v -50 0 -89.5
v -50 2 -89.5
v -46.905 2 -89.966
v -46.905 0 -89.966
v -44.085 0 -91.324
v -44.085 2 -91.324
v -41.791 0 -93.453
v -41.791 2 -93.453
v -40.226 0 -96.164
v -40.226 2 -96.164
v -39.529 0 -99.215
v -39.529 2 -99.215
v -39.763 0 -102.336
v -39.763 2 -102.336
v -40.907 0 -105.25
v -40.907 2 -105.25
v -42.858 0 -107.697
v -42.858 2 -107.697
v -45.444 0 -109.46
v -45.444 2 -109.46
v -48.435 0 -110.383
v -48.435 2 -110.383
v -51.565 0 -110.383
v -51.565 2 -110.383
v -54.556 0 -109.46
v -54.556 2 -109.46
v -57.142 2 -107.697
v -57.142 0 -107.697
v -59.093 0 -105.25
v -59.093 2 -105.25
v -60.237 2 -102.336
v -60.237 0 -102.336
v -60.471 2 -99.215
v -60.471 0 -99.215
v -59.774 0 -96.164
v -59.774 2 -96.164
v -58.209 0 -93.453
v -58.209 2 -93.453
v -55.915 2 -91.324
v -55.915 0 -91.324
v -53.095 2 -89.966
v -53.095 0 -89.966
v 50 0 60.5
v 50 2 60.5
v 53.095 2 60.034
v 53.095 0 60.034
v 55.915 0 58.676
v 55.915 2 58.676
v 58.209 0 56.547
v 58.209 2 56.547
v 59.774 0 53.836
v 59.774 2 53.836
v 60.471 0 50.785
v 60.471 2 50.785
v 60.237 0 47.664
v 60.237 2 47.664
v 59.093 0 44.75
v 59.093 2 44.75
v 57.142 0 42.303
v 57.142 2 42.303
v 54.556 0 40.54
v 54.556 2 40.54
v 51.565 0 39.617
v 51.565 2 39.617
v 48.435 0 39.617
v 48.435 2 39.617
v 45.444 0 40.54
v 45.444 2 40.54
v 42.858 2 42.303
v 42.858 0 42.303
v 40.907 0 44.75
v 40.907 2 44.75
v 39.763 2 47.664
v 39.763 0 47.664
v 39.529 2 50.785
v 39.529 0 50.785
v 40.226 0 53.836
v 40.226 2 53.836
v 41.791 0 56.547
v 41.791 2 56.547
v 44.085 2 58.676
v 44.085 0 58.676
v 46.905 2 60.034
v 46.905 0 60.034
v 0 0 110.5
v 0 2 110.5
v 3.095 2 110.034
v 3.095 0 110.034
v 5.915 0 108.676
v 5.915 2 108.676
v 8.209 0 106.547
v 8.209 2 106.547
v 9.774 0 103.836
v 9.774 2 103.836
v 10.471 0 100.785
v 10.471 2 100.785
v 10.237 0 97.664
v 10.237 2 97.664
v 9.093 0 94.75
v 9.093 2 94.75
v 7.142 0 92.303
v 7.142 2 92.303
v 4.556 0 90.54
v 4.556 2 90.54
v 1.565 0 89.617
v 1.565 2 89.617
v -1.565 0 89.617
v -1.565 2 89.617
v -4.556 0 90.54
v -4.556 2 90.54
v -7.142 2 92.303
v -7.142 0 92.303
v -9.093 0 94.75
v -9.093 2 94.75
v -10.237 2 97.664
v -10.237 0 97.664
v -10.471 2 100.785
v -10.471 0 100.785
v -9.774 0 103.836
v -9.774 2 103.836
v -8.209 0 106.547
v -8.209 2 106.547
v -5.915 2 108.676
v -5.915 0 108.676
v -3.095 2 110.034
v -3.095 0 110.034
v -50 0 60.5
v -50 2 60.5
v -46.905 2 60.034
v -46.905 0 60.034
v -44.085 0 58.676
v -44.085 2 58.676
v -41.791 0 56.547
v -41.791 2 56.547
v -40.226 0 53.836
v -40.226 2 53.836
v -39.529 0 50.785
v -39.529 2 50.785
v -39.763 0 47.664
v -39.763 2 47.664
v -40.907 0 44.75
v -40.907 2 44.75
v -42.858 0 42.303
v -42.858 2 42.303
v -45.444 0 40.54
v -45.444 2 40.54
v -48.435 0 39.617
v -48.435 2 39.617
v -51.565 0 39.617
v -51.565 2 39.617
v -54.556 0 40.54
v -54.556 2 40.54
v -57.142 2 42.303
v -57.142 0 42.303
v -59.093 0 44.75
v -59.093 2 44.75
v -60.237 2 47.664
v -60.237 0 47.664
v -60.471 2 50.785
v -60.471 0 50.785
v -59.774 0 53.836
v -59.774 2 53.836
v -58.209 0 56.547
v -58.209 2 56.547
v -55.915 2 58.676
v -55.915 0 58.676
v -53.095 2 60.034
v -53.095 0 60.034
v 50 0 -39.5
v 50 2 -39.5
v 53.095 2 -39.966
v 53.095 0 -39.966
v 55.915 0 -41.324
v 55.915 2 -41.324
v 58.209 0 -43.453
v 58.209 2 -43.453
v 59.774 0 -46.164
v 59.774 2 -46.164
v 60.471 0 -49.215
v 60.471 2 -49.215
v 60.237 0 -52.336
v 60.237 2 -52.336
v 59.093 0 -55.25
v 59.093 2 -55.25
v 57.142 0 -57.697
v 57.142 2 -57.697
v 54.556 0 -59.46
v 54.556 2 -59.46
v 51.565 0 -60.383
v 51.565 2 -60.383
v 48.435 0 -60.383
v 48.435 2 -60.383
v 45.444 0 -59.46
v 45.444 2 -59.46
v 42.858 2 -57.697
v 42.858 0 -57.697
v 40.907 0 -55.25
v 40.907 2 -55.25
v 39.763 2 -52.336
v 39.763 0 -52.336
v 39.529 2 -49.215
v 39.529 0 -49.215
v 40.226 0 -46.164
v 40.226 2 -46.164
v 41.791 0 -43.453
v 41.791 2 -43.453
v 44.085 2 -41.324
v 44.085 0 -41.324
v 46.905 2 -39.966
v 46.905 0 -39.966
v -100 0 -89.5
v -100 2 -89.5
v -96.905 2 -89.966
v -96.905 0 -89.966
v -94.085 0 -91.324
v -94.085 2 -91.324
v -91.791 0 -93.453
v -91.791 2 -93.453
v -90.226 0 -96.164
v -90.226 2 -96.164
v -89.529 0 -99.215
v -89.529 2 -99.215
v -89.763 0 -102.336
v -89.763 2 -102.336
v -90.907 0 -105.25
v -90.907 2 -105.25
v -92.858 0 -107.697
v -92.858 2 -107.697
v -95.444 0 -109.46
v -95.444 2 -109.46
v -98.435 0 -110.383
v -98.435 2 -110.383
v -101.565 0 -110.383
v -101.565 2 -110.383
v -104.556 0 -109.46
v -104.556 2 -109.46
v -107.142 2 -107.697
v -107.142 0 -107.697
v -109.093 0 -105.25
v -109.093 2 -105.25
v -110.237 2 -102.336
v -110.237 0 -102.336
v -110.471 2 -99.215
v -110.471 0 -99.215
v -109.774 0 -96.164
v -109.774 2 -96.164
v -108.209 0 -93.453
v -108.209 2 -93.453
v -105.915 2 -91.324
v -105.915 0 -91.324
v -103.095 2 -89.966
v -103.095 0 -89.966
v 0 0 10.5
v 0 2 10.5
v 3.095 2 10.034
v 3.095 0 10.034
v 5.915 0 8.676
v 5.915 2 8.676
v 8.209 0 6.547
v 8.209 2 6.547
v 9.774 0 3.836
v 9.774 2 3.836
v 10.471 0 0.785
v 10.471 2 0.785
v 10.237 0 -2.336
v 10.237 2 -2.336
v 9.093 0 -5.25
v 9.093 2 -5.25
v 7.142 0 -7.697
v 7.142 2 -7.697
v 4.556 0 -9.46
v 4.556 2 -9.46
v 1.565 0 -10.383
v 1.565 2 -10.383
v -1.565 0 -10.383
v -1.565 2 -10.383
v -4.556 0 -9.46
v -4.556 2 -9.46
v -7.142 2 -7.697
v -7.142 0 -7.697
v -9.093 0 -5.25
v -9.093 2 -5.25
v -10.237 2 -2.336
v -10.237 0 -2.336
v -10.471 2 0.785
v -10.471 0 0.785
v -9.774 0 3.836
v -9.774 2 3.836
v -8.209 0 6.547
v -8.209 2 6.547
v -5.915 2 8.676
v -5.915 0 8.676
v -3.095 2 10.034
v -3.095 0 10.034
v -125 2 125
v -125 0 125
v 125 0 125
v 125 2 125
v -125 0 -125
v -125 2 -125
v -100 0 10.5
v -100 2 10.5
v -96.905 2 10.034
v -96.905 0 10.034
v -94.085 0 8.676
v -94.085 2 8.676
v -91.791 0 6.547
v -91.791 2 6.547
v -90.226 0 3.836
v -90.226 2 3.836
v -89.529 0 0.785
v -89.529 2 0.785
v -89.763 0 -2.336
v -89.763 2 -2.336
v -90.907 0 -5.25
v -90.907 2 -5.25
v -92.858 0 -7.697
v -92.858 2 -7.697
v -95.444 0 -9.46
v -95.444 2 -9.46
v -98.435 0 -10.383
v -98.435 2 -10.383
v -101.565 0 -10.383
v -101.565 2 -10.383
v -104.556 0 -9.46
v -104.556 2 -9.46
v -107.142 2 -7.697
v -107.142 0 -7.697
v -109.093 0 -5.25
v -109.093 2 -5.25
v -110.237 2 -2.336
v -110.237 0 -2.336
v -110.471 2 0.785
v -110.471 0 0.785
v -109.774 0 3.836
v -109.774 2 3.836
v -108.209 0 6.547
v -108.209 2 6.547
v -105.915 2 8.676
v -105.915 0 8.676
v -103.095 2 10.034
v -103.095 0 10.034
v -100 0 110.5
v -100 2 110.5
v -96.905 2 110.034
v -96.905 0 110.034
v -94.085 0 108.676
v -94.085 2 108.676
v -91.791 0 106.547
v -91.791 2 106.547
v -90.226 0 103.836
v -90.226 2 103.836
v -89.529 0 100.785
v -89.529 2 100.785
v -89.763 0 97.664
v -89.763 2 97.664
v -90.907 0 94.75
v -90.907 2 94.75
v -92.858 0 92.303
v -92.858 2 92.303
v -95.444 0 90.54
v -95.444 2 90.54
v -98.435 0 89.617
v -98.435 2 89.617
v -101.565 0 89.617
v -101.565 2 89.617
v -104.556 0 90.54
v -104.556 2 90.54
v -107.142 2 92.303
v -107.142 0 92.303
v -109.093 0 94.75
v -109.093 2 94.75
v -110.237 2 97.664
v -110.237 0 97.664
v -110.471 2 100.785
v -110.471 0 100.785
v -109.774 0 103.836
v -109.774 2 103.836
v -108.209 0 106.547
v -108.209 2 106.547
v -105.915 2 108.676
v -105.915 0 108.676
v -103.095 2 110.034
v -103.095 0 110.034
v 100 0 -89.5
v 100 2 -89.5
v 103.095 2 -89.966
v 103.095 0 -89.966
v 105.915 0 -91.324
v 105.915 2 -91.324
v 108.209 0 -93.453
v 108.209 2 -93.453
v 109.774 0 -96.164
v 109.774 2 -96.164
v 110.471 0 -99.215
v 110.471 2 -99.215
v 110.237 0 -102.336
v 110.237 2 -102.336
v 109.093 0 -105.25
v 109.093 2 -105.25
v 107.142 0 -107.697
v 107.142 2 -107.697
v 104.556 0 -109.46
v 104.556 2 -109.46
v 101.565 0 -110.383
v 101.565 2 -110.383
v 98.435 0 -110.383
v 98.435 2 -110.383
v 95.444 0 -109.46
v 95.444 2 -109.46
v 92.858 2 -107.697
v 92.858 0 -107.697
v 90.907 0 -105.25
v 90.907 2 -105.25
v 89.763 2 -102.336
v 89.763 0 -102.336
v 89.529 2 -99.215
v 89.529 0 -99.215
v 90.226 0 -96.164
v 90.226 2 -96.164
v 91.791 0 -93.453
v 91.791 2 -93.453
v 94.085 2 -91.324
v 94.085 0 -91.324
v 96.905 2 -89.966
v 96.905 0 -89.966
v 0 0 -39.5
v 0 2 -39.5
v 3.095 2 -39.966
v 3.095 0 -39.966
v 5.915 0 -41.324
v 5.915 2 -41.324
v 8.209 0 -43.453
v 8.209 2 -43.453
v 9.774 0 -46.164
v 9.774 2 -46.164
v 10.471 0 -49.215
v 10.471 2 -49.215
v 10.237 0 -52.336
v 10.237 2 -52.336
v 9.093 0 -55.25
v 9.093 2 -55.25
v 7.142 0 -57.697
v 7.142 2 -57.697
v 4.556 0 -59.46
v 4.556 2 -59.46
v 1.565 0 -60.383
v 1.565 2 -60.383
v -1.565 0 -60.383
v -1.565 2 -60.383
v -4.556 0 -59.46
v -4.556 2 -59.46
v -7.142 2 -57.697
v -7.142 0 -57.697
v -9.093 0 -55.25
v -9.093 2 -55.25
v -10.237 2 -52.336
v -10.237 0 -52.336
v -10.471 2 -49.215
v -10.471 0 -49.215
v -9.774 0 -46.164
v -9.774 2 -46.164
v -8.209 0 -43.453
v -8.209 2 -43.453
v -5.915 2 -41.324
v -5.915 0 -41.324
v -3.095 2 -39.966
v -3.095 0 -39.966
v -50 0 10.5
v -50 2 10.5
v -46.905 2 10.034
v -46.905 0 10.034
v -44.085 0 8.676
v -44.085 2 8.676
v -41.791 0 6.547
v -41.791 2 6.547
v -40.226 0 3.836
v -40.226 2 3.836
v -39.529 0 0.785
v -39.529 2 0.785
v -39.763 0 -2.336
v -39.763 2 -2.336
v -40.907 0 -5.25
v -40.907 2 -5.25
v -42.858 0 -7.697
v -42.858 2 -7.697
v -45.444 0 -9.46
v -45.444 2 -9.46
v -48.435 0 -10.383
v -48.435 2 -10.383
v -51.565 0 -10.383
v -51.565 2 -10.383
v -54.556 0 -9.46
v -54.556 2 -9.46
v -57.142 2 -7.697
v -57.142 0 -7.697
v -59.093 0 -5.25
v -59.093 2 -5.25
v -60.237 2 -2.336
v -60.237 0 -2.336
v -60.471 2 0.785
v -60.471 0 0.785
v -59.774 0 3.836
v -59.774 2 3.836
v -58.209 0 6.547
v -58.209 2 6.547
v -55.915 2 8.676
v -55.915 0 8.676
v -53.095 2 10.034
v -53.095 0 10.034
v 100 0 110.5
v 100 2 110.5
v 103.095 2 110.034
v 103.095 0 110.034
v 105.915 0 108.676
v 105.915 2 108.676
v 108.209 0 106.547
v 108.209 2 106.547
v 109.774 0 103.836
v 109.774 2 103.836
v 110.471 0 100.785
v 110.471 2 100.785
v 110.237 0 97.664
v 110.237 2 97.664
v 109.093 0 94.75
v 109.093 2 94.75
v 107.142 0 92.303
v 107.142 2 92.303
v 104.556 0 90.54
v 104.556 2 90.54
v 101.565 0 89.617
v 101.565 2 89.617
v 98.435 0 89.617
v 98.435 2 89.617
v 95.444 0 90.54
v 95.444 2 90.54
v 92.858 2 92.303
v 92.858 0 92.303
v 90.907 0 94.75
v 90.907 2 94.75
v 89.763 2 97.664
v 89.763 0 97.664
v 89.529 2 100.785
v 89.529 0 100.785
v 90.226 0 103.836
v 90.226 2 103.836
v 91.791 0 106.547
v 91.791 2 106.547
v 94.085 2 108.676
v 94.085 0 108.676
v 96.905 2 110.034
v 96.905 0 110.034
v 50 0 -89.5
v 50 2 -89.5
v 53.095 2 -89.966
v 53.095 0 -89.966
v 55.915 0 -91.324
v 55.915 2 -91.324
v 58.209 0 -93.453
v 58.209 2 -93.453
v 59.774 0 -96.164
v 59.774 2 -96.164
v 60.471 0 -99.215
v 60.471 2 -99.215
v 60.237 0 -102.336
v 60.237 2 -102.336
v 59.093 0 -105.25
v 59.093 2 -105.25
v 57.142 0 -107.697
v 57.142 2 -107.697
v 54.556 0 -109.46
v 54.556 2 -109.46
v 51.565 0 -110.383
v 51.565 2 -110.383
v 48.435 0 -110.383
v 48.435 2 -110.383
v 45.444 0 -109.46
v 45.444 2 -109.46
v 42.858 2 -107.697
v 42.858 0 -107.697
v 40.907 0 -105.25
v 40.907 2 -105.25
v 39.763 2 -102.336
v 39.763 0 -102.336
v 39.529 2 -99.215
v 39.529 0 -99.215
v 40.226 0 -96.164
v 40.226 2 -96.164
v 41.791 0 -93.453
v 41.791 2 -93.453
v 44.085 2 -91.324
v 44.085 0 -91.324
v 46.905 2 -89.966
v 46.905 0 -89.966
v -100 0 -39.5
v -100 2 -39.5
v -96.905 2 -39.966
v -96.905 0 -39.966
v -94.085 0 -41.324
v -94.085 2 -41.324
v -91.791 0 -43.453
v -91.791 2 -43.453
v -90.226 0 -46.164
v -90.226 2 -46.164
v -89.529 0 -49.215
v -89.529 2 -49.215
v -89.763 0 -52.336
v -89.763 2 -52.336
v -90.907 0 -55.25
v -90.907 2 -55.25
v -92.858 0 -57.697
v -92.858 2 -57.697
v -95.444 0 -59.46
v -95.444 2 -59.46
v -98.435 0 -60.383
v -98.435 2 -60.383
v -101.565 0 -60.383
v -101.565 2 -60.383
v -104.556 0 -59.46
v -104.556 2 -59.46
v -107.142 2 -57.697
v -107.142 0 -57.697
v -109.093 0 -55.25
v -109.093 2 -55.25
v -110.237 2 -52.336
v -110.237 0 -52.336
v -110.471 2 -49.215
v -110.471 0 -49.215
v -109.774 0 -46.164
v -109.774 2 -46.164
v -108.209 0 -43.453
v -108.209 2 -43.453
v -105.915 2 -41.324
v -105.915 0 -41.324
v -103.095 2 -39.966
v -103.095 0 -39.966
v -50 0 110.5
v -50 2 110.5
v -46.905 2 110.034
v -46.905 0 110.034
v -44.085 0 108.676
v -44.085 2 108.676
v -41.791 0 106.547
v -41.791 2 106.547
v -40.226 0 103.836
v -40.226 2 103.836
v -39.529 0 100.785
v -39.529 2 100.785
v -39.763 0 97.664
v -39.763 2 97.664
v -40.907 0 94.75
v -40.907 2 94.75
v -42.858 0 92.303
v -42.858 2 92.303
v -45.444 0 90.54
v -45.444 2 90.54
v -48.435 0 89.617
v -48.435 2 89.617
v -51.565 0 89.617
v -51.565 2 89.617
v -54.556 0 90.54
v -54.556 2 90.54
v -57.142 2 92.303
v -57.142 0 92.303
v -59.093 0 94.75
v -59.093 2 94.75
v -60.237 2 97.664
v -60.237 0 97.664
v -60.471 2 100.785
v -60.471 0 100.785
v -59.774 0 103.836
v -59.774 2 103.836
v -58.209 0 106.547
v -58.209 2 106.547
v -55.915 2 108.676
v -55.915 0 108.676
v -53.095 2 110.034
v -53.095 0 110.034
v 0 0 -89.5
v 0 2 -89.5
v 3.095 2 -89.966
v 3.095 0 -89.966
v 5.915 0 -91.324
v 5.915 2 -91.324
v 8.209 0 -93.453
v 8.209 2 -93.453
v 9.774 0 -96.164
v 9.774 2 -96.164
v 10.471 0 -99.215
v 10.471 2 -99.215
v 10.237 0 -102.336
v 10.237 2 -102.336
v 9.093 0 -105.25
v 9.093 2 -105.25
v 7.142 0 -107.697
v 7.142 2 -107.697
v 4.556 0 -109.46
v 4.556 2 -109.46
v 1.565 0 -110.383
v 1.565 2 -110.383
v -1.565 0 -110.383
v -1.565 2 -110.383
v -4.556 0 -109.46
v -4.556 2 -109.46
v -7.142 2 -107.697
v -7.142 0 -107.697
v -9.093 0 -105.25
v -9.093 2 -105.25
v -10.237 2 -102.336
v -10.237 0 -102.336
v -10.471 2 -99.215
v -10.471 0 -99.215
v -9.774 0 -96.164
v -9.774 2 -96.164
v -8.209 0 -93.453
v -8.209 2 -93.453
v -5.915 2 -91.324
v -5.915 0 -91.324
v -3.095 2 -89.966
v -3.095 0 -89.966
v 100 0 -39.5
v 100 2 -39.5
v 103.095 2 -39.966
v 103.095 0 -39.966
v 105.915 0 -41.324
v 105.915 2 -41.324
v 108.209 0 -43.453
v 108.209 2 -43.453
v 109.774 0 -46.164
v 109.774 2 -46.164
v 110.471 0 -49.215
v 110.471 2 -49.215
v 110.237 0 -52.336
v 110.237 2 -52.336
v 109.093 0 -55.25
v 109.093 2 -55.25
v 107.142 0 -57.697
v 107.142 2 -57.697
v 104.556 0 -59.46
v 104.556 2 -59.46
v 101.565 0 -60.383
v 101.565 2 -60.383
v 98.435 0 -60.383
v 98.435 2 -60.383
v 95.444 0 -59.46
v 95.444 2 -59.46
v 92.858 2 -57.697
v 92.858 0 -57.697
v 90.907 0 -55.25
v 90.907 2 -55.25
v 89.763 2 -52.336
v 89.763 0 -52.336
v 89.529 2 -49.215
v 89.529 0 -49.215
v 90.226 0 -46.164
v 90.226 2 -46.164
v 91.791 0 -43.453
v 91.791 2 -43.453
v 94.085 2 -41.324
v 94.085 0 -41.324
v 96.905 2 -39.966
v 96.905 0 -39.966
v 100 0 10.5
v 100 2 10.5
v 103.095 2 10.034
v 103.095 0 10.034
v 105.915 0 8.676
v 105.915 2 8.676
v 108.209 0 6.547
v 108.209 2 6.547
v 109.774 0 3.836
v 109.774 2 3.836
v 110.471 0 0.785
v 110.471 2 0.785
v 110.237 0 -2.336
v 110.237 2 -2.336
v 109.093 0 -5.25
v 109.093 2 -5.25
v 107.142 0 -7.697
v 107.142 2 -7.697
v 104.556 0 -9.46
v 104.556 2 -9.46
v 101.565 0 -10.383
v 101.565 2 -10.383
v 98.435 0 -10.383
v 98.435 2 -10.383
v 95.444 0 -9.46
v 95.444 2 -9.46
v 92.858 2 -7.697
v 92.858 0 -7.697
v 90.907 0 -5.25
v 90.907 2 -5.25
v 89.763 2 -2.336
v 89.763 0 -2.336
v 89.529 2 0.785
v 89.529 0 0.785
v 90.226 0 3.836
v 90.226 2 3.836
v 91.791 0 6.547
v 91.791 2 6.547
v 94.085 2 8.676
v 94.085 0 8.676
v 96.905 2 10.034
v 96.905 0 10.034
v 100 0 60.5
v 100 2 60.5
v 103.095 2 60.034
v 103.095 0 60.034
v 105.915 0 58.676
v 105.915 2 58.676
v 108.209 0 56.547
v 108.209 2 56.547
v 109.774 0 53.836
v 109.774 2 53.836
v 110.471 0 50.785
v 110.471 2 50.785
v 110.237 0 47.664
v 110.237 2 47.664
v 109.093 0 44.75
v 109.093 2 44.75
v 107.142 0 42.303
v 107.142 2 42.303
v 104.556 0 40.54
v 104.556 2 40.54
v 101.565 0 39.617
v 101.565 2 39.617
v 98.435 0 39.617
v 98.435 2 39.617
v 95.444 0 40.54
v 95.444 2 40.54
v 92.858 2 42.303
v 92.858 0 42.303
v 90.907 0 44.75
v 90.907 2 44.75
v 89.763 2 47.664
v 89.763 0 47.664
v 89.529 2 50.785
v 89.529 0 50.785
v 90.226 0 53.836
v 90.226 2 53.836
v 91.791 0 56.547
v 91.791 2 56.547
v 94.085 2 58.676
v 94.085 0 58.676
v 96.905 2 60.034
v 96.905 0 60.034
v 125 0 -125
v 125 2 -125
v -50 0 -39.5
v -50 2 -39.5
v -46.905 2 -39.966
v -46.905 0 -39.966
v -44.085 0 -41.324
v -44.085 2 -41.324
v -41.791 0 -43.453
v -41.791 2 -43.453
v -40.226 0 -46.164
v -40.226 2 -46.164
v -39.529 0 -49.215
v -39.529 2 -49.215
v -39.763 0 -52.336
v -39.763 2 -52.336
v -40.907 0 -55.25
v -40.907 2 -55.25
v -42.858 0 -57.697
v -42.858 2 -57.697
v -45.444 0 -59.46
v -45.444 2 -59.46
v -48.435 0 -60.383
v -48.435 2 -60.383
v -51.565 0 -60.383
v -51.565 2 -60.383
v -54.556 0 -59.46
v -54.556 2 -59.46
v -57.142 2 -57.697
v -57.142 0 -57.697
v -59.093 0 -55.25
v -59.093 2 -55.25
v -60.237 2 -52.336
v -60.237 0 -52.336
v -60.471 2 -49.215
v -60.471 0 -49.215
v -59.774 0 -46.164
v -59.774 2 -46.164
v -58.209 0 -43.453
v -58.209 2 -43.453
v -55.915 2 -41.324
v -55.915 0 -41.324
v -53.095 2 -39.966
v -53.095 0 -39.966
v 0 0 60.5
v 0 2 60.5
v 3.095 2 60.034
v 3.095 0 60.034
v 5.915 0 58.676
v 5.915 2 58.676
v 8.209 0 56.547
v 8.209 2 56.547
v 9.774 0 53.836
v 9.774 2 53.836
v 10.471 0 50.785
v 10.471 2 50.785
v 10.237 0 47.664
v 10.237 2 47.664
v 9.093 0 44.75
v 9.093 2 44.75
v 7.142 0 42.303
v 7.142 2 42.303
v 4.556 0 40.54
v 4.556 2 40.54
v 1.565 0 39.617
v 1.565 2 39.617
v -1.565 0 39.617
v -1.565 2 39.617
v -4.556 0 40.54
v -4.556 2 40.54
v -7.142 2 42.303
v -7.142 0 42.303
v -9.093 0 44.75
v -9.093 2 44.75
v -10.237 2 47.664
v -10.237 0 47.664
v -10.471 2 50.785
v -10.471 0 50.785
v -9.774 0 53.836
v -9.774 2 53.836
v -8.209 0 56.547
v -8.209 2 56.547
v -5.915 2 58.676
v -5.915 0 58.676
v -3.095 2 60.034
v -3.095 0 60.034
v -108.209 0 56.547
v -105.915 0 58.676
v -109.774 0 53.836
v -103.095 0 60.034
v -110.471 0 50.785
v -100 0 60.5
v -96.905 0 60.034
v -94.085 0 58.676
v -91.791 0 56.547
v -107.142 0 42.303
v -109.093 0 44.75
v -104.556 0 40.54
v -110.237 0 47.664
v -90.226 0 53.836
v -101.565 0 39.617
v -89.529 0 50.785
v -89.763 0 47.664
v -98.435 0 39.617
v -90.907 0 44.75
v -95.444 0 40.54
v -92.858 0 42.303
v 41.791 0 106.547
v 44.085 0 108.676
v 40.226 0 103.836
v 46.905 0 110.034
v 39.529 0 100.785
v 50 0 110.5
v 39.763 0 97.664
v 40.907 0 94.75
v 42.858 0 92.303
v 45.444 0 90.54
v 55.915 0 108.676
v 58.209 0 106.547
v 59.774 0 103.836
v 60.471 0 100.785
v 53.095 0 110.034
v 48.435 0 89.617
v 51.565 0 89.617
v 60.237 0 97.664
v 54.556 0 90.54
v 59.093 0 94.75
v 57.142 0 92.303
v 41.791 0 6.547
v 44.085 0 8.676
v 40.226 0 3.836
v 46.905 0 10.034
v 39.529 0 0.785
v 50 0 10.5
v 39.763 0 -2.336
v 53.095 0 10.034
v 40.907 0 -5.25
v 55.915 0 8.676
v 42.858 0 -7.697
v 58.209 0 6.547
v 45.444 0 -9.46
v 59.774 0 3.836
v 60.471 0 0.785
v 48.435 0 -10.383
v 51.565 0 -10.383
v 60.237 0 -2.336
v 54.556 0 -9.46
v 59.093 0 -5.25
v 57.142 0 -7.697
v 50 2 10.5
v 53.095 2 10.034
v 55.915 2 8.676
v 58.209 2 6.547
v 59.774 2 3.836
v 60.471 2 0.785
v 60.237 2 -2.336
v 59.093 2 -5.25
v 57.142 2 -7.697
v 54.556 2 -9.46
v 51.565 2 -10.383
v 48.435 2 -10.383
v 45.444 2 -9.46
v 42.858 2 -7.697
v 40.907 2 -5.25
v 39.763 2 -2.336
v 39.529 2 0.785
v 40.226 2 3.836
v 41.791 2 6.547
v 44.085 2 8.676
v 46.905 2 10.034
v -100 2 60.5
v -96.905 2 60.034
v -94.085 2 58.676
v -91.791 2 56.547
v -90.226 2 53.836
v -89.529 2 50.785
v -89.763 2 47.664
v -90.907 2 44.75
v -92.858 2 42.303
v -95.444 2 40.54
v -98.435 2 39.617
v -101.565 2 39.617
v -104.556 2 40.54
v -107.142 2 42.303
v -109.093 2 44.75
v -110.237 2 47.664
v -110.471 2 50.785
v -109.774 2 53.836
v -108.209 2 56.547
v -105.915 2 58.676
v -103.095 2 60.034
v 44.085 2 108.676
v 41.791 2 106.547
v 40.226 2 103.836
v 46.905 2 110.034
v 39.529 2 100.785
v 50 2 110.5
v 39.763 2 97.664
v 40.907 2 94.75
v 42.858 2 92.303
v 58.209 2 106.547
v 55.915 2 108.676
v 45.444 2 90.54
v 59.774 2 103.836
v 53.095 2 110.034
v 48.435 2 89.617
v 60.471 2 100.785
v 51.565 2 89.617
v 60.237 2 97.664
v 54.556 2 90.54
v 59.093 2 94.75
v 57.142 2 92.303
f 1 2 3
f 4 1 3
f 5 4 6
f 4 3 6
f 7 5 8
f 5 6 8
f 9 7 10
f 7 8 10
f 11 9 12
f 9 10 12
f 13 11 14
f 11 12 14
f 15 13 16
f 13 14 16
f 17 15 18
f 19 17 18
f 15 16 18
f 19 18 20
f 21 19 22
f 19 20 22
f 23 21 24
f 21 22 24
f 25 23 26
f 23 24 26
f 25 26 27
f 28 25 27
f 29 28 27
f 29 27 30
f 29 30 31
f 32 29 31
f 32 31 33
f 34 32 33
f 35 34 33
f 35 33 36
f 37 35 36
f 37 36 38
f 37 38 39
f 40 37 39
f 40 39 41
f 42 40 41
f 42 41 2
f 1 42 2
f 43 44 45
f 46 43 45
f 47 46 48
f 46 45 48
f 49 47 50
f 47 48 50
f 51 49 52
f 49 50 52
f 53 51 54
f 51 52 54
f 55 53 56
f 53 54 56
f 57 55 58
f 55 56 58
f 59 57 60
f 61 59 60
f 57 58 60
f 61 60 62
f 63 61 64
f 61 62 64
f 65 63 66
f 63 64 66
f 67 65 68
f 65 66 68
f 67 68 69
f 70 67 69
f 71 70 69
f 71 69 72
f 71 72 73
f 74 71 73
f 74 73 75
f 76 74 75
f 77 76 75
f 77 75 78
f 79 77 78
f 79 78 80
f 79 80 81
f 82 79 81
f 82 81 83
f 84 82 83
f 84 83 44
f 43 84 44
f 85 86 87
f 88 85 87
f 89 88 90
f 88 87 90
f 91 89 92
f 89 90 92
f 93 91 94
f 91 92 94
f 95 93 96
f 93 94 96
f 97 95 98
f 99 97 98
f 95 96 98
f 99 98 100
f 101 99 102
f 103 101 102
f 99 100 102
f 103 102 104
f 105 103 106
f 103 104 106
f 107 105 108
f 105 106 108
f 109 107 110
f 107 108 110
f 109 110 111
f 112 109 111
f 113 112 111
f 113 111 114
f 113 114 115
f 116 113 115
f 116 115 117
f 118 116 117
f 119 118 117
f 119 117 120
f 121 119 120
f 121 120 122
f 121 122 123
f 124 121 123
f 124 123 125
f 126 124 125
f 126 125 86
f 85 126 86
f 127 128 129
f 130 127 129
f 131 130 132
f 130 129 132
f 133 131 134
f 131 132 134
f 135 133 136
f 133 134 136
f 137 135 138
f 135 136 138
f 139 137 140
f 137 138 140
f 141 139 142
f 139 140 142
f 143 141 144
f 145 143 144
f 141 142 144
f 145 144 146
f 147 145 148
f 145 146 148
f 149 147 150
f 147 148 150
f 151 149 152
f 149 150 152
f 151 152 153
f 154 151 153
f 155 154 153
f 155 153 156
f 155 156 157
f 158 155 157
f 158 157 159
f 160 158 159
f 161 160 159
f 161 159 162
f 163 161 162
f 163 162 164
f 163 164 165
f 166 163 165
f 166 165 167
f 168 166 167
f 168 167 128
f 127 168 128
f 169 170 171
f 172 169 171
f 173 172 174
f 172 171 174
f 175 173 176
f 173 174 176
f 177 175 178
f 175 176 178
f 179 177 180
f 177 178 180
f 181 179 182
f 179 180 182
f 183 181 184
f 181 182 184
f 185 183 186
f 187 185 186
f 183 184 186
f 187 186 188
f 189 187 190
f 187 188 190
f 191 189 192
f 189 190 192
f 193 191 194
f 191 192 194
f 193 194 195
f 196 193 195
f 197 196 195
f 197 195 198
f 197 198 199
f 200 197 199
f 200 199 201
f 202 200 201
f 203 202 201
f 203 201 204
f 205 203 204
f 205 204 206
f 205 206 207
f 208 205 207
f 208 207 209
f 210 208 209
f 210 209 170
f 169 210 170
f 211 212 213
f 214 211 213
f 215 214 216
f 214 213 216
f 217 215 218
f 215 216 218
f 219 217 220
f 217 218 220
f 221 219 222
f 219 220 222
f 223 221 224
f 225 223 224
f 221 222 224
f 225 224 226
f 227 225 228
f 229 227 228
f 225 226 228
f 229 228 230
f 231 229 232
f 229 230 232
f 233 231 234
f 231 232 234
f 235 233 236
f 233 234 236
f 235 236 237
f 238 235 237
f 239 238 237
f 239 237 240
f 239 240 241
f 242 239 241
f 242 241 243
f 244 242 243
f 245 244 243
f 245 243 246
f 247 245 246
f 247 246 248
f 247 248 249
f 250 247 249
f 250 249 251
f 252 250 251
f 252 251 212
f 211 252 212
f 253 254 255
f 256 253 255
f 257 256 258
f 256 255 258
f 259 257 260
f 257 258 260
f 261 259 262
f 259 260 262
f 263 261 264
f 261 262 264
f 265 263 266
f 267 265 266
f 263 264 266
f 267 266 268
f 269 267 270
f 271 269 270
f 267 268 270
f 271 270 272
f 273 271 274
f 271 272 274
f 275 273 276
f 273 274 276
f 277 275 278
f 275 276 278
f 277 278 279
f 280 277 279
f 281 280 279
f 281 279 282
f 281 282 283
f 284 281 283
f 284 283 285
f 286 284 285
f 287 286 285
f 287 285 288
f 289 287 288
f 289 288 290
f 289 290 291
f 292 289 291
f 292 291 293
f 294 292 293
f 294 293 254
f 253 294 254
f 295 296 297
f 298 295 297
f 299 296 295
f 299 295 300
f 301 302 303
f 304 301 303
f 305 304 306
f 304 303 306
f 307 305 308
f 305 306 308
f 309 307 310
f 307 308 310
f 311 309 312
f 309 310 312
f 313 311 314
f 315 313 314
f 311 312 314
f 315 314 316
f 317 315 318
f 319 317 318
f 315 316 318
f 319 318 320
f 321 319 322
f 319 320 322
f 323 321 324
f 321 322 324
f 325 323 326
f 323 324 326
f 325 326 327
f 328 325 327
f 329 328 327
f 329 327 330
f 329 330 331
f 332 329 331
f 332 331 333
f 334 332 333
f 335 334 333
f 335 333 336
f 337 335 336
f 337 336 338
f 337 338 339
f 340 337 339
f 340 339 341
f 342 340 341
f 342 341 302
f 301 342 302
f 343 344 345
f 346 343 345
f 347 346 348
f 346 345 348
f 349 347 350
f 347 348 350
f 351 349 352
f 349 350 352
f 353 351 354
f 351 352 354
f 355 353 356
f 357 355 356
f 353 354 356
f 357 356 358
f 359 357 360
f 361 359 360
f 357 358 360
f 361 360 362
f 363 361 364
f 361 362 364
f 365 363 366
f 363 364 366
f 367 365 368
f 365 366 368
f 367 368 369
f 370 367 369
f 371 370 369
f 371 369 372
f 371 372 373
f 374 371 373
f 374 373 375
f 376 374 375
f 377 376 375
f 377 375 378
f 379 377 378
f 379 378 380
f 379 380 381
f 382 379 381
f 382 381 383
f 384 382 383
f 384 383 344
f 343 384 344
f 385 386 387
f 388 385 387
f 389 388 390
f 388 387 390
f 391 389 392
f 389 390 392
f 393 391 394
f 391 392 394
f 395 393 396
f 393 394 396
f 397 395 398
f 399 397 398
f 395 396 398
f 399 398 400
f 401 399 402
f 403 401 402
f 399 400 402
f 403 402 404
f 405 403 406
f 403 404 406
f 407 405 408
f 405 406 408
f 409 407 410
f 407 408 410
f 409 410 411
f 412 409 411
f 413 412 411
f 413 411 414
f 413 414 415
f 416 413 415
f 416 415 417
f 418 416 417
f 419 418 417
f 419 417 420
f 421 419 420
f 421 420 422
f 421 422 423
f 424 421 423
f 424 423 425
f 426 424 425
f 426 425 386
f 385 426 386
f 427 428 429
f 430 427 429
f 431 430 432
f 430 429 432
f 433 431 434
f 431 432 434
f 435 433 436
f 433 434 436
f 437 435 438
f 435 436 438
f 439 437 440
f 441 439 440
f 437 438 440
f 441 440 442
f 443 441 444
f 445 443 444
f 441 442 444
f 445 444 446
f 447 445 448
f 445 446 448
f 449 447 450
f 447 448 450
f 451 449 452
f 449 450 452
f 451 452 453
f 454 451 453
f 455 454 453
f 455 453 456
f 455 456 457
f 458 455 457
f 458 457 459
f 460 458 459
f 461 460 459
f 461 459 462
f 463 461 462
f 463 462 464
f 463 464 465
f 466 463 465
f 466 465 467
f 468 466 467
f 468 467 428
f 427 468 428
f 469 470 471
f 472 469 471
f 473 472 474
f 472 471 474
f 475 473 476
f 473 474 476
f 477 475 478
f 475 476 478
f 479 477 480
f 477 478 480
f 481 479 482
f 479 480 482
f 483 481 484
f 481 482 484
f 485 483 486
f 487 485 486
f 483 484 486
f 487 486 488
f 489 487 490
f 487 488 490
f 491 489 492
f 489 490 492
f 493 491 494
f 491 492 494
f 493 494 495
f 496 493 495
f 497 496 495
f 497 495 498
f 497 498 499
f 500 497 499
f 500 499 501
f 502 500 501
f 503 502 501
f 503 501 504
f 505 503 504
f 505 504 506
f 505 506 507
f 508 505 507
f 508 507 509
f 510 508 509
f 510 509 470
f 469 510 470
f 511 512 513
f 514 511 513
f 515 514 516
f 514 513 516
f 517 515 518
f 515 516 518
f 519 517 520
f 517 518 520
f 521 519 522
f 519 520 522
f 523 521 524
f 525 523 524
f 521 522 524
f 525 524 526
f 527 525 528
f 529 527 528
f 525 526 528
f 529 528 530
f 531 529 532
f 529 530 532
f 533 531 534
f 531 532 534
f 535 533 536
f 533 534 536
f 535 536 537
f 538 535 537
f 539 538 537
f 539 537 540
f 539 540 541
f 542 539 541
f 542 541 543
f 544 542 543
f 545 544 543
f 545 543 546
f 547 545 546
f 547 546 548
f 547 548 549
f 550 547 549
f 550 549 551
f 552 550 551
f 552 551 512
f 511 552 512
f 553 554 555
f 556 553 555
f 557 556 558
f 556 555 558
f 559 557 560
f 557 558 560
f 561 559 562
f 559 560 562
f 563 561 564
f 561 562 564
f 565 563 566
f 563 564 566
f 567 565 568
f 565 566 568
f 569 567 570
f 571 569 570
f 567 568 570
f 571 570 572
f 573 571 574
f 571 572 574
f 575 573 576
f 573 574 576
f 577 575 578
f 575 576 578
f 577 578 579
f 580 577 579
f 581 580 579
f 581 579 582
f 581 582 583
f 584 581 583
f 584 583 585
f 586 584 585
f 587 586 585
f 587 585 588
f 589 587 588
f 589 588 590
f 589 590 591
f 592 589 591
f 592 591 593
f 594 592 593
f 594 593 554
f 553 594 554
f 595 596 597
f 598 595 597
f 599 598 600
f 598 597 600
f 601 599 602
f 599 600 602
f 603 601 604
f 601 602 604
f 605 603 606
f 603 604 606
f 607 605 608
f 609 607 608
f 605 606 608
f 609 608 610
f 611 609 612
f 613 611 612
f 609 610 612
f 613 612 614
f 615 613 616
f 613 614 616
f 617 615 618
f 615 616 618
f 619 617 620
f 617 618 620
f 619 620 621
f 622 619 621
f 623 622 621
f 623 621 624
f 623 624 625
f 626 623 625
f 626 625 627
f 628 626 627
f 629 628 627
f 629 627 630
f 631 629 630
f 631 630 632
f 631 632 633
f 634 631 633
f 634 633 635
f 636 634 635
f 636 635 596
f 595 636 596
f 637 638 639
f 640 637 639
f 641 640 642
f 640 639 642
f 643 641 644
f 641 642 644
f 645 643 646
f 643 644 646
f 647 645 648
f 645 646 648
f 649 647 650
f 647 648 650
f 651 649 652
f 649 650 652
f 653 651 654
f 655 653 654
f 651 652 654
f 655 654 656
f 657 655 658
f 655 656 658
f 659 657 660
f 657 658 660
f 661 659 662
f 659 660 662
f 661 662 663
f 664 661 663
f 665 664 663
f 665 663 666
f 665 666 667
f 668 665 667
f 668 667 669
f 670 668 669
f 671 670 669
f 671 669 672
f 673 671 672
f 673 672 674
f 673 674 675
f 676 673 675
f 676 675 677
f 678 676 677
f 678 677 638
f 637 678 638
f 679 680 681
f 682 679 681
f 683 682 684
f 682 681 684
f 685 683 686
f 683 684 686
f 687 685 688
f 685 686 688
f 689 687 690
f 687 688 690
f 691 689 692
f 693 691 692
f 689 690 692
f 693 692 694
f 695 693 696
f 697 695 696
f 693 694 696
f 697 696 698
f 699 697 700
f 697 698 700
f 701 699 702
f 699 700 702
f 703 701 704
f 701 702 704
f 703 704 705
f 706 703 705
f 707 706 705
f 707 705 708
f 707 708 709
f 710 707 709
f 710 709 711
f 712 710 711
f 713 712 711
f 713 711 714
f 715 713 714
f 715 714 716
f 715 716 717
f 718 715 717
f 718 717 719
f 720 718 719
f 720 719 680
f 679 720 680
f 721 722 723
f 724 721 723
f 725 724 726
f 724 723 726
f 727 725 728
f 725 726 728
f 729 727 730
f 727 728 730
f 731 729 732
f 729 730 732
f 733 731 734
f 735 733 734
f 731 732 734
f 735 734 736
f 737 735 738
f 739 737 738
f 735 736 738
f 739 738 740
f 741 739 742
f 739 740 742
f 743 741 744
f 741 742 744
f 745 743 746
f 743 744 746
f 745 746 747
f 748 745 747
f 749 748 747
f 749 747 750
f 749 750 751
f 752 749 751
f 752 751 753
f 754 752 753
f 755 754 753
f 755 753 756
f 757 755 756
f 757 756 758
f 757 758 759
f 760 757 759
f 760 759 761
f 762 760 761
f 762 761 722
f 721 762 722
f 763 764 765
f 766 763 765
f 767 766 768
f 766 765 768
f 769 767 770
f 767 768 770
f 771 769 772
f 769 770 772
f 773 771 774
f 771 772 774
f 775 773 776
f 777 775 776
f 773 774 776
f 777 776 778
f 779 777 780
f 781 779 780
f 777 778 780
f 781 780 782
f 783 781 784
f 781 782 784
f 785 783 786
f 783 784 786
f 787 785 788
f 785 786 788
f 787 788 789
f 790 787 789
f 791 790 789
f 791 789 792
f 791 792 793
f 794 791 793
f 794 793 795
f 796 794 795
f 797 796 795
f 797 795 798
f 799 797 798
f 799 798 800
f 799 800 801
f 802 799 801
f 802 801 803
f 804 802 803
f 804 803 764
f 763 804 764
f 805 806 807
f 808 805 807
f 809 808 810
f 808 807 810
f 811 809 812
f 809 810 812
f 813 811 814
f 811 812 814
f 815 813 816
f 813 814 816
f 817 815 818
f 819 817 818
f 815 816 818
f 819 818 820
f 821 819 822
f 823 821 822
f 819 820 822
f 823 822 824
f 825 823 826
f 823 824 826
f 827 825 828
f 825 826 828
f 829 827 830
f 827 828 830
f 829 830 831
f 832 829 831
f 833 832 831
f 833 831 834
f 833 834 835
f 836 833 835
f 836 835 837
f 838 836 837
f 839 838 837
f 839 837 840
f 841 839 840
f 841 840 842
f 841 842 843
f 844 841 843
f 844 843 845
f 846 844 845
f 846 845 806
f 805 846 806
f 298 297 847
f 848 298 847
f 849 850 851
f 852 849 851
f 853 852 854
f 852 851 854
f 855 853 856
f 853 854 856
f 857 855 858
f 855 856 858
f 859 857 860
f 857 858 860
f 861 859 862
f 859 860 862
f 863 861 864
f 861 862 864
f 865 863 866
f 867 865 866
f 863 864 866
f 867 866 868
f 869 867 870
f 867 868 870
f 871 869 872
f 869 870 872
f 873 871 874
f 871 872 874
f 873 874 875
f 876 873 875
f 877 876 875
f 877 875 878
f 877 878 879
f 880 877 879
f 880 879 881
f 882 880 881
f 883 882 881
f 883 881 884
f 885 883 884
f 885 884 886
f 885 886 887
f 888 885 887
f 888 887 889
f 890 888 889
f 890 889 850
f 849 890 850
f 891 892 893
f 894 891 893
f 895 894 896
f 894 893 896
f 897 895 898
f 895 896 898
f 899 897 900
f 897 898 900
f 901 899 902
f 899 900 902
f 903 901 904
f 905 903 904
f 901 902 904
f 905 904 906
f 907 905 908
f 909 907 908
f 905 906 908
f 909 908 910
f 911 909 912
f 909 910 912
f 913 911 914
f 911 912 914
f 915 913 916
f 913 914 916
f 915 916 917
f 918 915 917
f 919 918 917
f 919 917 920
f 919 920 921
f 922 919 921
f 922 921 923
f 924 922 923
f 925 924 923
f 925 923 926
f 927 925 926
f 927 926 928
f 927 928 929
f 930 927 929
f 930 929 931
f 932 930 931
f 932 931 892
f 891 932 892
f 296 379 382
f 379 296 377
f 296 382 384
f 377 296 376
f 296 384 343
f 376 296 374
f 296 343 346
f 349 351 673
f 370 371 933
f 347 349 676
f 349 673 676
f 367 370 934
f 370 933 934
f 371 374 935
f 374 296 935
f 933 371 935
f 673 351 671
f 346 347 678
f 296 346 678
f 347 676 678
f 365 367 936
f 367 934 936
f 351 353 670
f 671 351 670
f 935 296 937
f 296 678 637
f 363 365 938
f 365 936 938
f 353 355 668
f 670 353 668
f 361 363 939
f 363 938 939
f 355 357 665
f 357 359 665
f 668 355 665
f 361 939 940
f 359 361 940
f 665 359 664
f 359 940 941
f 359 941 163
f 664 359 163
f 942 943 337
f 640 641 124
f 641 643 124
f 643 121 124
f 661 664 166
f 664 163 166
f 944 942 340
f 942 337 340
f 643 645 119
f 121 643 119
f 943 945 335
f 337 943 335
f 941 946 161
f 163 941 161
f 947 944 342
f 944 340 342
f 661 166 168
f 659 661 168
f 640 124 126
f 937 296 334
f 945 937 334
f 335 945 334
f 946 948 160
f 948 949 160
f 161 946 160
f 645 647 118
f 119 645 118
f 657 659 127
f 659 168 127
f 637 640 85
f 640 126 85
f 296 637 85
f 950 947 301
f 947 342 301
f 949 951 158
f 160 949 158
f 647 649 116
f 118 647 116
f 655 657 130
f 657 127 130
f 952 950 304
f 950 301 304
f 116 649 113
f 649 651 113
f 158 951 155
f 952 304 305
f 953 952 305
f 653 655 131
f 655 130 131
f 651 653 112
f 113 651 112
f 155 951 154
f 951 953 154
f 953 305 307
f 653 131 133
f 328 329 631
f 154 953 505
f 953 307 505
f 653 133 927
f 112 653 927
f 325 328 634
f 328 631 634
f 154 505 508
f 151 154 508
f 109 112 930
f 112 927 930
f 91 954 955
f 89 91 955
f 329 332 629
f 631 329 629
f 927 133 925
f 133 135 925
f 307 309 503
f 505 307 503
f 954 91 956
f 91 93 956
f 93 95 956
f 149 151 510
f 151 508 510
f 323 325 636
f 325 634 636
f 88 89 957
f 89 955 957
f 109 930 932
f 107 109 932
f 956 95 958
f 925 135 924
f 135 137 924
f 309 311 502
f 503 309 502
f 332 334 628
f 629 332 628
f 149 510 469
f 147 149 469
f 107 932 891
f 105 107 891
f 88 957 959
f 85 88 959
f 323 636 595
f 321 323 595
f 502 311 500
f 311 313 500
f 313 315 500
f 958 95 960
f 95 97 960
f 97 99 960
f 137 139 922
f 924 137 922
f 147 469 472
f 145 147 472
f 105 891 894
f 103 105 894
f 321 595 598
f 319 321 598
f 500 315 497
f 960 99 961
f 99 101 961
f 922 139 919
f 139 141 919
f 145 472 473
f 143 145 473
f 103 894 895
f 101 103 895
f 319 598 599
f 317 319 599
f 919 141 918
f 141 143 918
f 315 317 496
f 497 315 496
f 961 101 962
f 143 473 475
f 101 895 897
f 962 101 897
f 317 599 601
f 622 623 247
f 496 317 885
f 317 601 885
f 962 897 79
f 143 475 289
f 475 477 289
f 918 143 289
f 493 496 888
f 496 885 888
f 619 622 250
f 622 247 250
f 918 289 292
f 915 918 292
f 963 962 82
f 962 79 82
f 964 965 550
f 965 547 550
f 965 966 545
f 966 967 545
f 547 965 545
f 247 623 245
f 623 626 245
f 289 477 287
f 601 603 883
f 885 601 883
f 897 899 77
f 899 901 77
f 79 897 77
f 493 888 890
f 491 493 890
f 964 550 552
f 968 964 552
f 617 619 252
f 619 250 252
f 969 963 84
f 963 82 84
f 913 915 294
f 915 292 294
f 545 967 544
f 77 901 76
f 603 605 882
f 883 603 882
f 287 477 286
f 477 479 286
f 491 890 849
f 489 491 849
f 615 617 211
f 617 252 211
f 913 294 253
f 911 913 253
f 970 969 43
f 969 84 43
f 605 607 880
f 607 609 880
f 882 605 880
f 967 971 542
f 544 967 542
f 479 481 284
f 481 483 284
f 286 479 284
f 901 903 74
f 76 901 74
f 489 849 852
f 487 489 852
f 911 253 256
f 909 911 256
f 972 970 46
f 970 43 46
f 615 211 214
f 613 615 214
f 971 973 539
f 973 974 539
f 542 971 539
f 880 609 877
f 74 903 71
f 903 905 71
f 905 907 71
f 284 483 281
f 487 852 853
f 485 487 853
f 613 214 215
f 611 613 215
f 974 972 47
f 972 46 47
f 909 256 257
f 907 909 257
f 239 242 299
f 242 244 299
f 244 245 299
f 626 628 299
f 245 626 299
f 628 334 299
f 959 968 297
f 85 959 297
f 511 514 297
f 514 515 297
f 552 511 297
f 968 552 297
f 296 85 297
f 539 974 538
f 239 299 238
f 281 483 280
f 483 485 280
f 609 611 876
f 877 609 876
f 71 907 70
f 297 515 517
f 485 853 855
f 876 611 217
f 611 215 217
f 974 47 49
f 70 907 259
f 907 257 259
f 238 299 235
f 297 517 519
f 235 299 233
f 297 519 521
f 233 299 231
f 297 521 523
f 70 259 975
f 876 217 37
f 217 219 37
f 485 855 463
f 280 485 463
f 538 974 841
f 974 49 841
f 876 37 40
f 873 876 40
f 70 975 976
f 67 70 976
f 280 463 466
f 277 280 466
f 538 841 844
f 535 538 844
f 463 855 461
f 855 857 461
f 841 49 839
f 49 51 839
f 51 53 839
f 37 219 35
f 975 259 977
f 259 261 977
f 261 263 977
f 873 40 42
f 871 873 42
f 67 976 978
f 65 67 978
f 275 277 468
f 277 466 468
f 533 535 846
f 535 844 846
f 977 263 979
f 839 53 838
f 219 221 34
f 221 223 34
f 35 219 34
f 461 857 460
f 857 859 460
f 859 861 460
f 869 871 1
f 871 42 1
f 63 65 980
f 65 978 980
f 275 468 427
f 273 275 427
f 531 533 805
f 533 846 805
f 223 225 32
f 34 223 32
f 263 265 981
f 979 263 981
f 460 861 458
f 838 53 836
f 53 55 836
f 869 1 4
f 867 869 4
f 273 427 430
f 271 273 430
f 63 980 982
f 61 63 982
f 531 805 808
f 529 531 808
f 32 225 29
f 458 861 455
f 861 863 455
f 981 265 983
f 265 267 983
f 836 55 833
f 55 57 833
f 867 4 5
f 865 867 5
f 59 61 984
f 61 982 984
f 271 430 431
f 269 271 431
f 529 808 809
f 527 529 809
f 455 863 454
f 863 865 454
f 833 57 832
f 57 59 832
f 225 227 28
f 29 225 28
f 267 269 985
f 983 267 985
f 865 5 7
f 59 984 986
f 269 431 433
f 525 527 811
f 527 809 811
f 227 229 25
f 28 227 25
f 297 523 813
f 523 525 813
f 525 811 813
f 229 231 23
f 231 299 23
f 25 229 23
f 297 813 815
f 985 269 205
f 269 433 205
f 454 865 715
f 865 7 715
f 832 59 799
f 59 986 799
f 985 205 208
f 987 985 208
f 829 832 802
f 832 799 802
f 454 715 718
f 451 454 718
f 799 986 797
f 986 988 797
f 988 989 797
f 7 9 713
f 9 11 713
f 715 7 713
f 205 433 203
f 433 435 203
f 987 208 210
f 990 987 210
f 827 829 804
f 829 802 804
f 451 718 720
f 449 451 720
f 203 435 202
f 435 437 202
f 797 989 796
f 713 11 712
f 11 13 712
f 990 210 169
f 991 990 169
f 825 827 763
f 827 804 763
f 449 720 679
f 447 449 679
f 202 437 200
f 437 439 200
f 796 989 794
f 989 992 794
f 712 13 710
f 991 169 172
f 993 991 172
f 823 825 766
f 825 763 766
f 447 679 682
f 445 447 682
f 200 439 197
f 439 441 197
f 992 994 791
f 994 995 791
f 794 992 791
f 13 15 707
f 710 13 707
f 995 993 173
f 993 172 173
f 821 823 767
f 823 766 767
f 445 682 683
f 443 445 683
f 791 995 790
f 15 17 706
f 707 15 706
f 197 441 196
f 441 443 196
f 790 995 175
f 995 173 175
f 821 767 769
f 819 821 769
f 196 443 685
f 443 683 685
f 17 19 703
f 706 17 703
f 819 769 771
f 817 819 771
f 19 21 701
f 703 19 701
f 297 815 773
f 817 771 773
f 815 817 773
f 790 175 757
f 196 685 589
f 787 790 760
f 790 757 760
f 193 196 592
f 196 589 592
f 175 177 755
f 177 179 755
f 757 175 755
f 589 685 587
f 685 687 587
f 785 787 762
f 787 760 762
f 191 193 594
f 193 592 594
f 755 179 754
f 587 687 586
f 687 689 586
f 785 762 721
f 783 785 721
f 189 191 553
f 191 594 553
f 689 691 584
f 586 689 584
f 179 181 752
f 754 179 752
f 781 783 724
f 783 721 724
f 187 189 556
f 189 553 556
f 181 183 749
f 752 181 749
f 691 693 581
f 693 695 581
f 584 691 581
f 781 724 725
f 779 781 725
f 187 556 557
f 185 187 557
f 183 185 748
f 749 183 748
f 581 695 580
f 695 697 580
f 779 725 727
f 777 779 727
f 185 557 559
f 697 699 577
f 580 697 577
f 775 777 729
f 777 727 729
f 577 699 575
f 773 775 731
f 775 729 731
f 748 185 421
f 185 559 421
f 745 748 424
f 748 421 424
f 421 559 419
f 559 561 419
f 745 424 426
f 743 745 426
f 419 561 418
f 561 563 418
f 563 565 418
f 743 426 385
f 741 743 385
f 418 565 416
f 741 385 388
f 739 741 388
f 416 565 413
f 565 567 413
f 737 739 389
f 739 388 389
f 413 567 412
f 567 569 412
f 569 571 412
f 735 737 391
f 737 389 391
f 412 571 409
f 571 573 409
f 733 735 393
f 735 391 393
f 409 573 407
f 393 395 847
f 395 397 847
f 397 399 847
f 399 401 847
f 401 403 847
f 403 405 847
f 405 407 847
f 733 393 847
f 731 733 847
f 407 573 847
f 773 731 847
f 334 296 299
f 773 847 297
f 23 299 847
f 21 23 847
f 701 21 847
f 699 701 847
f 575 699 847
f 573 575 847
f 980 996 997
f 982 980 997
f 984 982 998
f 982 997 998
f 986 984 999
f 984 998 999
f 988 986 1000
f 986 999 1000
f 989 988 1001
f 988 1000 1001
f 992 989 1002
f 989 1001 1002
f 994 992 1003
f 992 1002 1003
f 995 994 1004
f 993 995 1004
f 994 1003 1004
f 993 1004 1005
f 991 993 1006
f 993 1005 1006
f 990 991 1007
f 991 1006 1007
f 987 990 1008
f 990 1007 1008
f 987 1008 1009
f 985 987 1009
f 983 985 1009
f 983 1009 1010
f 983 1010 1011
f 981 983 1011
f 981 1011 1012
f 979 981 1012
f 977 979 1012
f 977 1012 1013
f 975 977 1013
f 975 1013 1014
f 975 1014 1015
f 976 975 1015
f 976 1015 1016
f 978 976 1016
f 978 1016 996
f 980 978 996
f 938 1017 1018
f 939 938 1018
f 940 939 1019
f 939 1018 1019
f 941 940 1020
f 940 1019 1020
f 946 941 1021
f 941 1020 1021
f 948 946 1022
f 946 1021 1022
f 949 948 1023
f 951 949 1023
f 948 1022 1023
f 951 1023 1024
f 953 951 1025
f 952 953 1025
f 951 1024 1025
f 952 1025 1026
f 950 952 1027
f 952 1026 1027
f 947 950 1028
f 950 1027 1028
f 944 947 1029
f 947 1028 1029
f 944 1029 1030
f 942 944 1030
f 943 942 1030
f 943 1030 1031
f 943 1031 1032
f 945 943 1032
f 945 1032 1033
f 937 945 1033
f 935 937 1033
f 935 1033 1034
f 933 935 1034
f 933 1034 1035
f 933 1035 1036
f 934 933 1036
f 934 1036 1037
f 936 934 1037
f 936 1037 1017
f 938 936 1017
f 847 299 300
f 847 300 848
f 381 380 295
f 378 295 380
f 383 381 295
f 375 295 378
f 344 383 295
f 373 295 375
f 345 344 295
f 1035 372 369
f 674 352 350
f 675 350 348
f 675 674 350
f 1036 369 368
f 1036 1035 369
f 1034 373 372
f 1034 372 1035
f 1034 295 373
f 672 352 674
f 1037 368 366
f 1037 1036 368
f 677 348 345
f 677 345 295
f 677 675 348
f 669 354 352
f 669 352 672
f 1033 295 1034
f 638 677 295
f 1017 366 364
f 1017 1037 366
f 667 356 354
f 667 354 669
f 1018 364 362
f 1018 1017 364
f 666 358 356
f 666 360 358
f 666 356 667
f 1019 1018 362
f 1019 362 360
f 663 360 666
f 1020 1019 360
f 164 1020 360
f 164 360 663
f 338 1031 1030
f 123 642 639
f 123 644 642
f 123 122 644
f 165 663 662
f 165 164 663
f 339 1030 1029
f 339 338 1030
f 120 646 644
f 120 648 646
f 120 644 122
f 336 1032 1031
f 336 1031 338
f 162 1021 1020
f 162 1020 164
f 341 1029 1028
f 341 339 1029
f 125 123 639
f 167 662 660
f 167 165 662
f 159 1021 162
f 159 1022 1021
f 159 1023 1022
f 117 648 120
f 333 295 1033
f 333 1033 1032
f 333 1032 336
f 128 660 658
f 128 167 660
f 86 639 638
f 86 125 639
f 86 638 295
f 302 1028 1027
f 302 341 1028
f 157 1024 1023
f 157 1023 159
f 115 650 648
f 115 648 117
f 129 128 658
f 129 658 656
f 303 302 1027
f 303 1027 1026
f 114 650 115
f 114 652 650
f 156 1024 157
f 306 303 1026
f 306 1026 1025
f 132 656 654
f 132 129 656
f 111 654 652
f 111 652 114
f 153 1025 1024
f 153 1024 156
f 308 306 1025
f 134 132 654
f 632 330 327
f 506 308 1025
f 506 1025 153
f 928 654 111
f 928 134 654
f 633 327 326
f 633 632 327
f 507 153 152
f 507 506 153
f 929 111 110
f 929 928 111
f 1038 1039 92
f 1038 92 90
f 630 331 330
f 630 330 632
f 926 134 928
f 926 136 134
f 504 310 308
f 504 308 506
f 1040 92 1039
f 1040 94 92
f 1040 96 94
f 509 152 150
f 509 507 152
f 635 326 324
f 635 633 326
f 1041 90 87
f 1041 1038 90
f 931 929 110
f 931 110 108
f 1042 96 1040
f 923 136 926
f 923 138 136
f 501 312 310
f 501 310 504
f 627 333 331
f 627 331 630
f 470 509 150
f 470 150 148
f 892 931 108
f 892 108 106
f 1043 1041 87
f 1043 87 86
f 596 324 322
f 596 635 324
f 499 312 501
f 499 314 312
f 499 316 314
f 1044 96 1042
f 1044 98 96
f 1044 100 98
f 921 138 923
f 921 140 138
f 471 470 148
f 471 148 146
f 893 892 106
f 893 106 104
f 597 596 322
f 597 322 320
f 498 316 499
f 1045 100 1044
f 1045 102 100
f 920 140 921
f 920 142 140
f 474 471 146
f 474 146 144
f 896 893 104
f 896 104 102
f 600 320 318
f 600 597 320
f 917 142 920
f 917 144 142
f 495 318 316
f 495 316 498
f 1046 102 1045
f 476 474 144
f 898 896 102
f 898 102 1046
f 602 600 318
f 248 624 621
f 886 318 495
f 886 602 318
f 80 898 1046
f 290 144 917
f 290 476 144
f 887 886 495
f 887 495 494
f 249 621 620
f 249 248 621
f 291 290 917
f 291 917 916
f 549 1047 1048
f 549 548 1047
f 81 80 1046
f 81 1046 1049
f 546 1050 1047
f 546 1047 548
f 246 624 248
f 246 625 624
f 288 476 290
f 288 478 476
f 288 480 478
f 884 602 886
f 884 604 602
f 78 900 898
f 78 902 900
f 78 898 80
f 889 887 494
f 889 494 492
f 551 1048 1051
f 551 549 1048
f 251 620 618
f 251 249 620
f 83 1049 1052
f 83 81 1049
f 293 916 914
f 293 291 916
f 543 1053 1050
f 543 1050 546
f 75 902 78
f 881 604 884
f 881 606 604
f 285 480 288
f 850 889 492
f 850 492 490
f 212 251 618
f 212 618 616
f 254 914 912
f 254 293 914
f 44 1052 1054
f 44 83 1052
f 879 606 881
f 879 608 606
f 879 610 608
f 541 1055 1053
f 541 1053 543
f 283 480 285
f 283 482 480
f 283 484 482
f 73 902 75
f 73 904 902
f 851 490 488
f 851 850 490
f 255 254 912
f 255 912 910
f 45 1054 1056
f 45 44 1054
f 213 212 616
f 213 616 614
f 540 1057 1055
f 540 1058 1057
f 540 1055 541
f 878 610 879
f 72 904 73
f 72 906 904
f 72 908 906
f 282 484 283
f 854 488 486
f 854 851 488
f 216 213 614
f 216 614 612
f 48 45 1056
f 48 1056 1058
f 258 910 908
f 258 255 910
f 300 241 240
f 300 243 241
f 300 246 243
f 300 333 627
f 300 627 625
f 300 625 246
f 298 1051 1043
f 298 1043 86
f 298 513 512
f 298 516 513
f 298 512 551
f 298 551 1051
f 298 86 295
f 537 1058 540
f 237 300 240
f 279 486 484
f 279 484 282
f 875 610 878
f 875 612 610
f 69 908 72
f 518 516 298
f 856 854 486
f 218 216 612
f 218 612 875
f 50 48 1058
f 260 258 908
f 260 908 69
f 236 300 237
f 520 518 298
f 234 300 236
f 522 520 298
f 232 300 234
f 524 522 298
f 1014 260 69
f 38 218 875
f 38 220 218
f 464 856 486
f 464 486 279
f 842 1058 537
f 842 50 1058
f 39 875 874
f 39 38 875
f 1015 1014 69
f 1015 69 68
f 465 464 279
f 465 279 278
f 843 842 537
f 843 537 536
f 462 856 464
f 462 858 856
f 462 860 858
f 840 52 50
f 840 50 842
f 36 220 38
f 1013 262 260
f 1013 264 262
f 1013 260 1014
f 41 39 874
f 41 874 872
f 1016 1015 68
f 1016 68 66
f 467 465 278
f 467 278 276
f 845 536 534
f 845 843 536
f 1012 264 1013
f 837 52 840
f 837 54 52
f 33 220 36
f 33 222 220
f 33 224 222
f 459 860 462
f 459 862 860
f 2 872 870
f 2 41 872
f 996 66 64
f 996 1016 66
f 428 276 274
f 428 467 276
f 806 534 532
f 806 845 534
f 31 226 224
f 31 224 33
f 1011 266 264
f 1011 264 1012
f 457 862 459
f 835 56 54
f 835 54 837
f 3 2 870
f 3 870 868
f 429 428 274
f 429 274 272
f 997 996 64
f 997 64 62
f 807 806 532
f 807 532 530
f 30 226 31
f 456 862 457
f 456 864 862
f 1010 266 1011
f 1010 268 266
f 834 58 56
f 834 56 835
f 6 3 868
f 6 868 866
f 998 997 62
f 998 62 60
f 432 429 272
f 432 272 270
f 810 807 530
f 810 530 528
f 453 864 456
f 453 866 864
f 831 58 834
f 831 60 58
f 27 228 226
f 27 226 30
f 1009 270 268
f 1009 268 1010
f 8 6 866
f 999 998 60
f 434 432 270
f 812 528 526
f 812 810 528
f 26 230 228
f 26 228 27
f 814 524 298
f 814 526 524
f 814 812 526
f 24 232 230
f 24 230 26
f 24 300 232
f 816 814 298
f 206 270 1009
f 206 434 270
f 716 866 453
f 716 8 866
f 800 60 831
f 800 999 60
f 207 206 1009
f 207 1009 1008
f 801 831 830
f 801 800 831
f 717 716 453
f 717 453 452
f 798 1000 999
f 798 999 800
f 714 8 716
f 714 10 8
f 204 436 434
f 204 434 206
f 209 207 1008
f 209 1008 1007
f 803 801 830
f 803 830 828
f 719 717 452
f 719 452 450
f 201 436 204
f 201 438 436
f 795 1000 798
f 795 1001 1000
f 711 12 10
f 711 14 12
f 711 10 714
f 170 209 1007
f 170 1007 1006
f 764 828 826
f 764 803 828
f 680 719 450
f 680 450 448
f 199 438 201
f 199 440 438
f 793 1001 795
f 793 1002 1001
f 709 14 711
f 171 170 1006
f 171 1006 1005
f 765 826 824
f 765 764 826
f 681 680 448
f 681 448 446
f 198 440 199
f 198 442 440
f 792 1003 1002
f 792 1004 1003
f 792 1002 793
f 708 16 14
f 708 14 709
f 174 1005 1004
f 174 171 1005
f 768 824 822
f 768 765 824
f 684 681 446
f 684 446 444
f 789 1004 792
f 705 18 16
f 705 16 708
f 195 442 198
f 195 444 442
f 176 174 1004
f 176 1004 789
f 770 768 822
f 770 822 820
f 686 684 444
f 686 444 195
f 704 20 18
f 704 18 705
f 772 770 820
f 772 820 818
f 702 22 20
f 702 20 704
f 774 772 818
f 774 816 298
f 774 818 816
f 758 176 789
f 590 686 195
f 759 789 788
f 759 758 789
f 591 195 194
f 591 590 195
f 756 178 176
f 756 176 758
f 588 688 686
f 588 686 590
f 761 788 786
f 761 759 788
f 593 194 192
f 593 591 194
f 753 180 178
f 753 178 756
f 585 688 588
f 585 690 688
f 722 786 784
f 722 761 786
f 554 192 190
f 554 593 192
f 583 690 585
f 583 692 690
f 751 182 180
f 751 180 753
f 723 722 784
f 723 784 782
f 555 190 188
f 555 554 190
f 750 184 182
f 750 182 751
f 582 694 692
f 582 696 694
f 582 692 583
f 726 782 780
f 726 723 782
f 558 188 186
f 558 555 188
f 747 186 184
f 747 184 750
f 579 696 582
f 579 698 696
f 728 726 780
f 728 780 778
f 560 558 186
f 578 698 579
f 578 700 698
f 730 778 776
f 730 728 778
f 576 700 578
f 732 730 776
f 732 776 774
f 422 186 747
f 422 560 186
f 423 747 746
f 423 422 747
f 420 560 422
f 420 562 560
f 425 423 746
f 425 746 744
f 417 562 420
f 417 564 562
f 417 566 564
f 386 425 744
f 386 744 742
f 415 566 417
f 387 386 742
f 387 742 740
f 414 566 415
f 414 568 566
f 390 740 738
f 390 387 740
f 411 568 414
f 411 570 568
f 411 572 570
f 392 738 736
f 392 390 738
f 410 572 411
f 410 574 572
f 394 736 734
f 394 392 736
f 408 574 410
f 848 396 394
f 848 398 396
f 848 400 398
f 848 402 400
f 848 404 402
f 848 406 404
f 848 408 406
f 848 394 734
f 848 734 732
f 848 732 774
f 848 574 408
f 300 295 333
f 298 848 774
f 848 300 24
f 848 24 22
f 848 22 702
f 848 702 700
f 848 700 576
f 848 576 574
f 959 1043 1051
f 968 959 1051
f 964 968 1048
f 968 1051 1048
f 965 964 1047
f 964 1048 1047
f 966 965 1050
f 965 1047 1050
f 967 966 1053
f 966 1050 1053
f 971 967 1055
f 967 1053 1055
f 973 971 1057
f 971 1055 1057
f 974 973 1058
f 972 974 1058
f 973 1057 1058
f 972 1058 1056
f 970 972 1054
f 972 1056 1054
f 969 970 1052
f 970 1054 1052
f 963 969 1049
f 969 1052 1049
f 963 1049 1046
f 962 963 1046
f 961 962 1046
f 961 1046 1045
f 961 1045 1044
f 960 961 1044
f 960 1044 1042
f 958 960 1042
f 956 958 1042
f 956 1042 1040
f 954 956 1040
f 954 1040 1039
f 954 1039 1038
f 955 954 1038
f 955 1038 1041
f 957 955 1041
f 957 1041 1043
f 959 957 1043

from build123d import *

# Parameters (mm, degrees)
SKETCH1_W           = 250
SKETCH1_H           = 250
BOSS_EXTRUDE1_DEPTH = 2
SKETCH2_R           = 10.5
CUT_EXTRUDE1_DEPTH  = 177.788008643


with BuildPart() as part:
    # Sketch1 → Boss-Extrude1 (new body)
    with BuildSketch(Plane(origin=(0, 0, 0), x_dir=(1, 0, 0), z_dir=(0, 1, 0))):
        Rectangle(SKETCH1_W, SKETCH1_H)
    extrude(amount=BOSS_EXTRUDE1_DEPTH)

    # Sketch2 → Cut-Extrude1 (cut, through all)
    with BuildSketch(Plane(origin=(0, 2, 0), x_dir=(1, 0, 0), z_dir=(0, 1, 0))):
        with Locations(Location((-100, 100, 0), (0, 0, 270))):
            Circle(SKETCH2_R)
        with Locations(Location((-50, 100, 0), (0, 0, 270))):
            Circle(SKETCH2_R)
        with Locations(Location((0, 100, 0), (0, 0, 270))):
            Circle(SKETCH2_R)
        with Locations(Location((50, 100, 0), (0, 0, 270))):
            Circle(SKETCH2_R)
        with Locations(Location((100, 100, 0), (0, 0, 270))):
            Circle(SKETCH2_R)
        with Locations(Location((-50, 50, 0), (0, 0, 270))):
            Circle(SKETCH2_R)
        with Locations(Location((0, 50, 0), (0, 0, 270))):
            Circle(SKETCH2_R)
        with Locations(Location((50, 50, 0), (0, 0, 270))):
            Circle(SKETCH2_R)
        with Locations(Location((100, 50, 0), (0, 0, 270))):
            Circle(SKETCH2_R)
        with Locations(Location((-50, 0, 0), (0, 0, 270))):
            Circle(SKETCH2_R)
        with Locations(Location((0, 0, 0), (0, 0, 270))):
            Circle(SKETCH2_R)
        with Locations(Location((50, 0, 0), (0, 0, 270))):
            Circle(SKETCH2_R)
        with Locations(Location((100, 0, 0), (0, 0, 270))):
            Circle(SKETCH2_R)
        with Locations(Location((-50, -50, 0), (0, 0, 270))):
            Circle(SKETCH2_R)
        with Locations(Location((0, -50, 0), (0, 0, 270))):
            Circle(SKETCH2_R)
        with Locations(Location((50, -50, 0), (0, 0, 270))):
            Circle(SKETCH2_R)
        with Locations(Location((100, -50, 0), (0, 0, 270))):
            Circle(SKETCH2_R)
        with Locations(Location((-50, -100, 0), (0, 0, 270))):
            Circle(SKETCH2_R)
        with Locations(Location((0, -100, 0), (0, 0, 270))):
            Circle(SKETCH2_R)
        with Locations(Location((50, -100, 0), (0, 0, 270))):
            Circle(SKETCH2_R)
        with Locations(Location((100, -100, 0), (0, 0, 270))):
            Circle(SKETCH2_R)
        with Locations(Location((-100, 50, 0), (0, 0, 270))):
            Circle(SKETCH2_R)
        with Locations(Location((-100, 0, 0), (0, 0, 270))):
            Circle(SKETCH2_R)
        with Locations(Location((-100, -50, 0), (0, 0, 270))):
            Circle(SKETCH2_R)
        with Locations(Location((-100, -100, 0), (0, 0, 270))):
            Circle(SKETCH2_R)
    extrude(amount=-CUT_EXTRUDE1_DEPTH, mode=Mode.SUBTRACT)


solid = part.part
